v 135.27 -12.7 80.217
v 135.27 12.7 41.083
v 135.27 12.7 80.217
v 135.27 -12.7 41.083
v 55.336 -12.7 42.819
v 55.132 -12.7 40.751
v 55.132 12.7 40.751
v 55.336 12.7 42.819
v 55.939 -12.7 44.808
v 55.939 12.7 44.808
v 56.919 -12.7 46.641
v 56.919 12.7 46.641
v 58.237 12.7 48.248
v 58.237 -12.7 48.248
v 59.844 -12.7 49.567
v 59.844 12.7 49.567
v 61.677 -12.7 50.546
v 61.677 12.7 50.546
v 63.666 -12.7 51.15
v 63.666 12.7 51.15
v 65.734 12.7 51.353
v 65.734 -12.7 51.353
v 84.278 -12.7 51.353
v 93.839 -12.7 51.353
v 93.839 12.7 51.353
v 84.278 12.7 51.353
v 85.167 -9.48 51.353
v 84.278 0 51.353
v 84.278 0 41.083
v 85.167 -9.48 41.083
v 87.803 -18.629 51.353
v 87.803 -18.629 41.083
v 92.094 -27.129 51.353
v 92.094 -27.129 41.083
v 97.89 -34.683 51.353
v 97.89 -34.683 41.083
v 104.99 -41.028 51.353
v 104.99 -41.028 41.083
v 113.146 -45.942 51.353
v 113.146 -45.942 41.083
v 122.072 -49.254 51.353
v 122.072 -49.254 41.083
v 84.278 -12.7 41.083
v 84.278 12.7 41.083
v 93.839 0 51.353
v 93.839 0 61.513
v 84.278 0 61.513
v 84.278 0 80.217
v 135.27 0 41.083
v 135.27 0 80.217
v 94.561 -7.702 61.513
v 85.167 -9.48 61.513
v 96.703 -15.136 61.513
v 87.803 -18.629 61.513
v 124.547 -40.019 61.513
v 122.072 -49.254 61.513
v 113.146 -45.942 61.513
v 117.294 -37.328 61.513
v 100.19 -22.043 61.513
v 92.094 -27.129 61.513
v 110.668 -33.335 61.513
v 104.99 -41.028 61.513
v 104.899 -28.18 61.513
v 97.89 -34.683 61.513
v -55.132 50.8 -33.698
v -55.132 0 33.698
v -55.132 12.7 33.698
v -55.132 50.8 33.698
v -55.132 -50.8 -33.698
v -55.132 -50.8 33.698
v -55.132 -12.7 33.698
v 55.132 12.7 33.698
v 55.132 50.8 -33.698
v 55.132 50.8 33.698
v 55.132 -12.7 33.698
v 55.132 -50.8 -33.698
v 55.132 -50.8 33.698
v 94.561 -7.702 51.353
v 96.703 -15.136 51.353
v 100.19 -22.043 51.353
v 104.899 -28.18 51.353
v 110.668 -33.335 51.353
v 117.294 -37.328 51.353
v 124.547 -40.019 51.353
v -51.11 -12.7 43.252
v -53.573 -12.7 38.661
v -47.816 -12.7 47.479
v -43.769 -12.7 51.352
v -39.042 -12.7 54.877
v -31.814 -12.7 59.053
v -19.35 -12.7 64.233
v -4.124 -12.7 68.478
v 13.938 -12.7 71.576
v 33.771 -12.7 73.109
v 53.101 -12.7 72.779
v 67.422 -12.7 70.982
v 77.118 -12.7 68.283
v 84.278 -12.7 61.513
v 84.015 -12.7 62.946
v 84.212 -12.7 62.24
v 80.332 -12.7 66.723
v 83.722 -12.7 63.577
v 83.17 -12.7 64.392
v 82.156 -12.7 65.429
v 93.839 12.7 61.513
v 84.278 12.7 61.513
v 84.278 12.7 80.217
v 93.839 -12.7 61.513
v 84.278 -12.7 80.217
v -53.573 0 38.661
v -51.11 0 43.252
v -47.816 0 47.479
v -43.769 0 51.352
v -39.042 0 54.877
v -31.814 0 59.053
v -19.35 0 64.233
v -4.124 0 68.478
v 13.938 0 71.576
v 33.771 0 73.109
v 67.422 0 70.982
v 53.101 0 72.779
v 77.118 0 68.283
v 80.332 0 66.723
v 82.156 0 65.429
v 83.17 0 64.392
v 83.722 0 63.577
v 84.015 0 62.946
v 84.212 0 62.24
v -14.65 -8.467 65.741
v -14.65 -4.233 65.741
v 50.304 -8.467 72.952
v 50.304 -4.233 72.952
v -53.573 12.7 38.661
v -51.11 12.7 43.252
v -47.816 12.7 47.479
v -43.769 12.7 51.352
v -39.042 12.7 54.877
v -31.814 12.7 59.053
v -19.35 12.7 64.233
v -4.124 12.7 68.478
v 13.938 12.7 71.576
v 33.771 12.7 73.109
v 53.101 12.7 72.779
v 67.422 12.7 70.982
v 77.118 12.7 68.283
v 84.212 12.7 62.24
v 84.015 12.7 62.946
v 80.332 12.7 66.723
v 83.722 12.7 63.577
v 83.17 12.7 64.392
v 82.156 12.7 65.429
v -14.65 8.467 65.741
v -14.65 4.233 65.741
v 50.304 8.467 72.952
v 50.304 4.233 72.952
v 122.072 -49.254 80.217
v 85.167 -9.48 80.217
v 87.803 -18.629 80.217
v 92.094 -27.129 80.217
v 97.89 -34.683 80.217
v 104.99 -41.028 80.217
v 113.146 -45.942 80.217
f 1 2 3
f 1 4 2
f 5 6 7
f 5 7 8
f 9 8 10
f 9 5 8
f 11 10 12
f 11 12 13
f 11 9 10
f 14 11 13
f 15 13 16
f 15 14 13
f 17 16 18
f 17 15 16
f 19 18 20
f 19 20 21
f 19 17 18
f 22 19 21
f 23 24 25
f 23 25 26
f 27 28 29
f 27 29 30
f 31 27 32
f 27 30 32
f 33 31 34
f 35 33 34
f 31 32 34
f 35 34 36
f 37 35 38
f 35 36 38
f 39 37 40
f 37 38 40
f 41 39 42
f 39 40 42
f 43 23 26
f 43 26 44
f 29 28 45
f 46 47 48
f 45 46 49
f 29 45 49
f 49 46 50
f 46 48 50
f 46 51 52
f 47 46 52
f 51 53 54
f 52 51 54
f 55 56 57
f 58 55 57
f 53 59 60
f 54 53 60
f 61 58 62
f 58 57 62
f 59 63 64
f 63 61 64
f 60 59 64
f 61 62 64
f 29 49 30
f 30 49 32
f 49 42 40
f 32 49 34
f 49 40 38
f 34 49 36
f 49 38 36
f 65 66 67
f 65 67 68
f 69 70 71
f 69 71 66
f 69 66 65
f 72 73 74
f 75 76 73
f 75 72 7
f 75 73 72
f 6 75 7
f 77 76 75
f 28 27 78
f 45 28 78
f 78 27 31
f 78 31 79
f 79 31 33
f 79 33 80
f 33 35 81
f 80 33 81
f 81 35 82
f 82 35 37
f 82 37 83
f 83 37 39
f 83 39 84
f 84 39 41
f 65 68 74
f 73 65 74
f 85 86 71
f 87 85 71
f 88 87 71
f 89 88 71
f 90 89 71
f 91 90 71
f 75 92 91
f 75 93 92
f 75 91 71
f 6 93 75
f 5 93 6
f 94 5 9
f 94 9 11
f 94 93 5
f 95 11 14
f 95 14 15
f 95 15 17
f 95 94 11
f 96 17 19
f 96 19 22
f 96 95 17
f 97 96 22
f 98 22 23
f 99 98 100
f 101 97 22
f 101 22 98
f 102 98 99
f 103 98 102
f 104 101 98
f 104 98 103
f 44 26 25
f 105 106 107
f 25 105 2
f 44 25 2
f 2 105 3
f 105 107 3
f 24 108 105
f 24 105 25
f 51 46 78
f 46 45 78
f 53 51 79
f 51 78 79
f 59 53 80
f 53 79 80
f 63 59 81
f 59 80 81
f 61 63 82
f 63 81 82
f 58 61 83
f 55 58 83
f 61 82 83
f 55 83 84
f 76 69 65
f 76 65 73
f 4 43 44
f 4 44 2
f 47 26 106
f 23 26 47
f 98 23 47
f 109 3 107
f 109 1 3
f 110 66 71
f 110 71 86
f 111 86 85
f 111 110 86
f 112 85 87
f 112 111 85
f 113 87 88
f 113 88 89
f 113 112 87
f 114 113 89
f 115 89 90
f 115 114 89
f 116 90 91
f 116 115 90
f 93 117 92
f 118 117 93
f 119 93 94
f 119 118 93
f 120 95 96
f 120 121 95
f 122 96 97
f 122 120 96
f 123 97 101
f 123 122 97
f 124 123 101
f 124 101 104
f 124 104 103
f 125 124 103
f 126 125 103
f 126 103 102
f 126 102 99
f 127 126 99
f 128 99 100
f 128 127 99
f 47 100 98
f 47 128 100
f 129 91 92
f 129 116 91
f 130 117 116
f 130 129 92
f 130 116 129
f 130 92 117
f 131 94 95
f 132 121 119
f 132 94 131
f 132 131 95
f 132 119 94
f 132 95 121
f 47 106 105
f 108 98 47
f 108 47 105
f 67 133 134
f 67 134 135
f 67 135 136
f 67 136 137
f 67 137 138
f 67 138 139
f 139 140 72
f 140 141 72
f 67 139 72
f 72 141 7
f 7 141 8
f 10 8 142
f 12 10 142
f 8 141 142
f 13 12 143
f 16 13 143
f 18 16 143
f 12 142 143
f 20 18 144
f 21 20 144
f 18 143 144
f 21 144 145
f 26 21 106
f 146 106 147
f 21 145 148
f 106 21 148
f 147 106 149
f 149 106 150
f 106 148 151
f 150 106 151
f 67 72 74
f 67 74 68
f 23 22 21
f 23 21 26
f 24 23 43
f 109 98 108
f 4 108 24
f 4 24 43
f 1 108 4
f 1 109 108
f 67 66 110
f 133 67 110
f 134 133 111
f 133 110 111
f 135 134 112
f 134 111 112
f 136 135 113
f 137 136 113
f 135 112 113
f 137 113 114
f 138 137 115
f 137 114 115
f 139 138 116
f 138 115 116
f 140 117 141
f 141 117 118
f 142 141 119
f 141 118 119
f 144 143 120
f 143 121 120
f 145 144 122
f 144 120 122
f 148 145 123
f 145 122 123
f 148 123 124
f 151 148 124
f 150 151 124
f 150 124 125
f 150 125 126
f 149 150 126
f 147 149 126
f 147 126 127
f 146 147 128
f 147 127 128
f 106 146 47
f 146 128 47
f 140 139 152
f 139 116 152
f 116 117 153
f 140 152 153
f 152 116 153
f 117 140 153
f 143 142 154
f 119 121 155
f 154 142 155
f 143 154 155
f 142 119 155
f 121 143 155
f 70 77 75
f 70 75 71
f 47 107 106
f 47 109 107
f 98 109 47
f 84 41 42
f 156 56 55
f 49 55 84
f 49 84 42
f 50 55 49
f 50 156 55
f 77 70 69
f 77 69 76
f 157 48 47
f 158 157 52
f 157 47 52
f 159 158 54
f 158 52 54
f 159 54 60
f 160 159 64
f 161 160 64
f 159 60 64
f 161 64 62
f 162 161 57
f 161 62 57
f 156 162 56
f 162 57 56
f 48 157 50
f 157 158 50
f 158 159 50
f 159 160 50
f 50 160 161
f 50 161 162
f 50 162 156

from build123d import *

# Parameters (mm, degrees)
F1_DEPTH = 50.8
F2_DEPTH = 12.7
F3_ANGLE = 75


with BuildPart() as f1:
    # F0 (on Front) → F1 (new body, symmetric)
    with BuildSketch(Plane.XZ):
        Polygon((44.971988, 33.697547), (-55.131988, 33.697547), (-55.131988, -33.697547), (55.131988, -33.697547), (55.131988, 33.697547), align=None)
    extrude(amount=F1_DEPTH, both=True)

    # F0 (on Front) → F2 (join, symmetric)
    with BuildSketch(Plane.XZ):
        Polygon((84.278196, 80.2169), (84.278196, 61.513367), (93.839183, 61.513367), (93.839183, 51.353367), (84.278196, 51.353367), (84.278196, 41.083422), (135.270059, 41.083422), (135.270059, 80.2169), align=None)
        with BuildLine():
            Line((44.971988, 40.750895), (44.971988, 33.697547))
            Line((44.971988, 33.697547), (55.131988, 33.697547))
            Line((55.131988, 33.697547), (55.131988, 40.750895))
            ThreePointArc((55.131988, 40.750895), (58.23738, 48.247975), (65.73446, 51.353367))
            Line((65.73446, 51.353367), (84.278196, 51.353367))
            Line((84.278196, 51.353367), (84.278196, 61.513367))
            Line((84.278196, 61.513367), (65.73446, 61.513367))
            ThreePointArc((65.73446, 61.513367), (51.053175, 55.43218), (44.971988, 40.750895))
        make_face()
        with BuildLine():
            add(Edge.make_bspline(
                [(-55.131988, 33.697547), (-45.370411, 80.2169), (84.278196, 80.2169), (84.278196, 61.513367)],
                knots=[0, 0, 0, 0, 142.158078, 142.158078, 142.158078, 142.158078], degree=3))
            Line((-55.131988, 33.697547), (44.971988, 33.697547))
            Line((44.971988, 33.697547), (44.971988, 40.750895))
            ThreePointArc((44.971988, 40.750895), (51.053175, 55.43218), (65.73446, 61.513367))
            Line((65.73446, 61.513367), (84.278196, 61.513367))
        make_face()
    extrude(amount=F2_DEPTH, both=True)


with BuildPart() as f3:
    # F0 (on Front) → F3 (revolve)
    with BuildSketch(Plane.XZ):
        Polygon((84.278196, 80.2169), (84.278196, 61.513367), (93.839183, 61.513367), (93.839183, 51.353367), (84.278196, 51.353367), (84.278196, 41.083422), (135.270059, 41.083422), (135.270059, 80.2169), align=None)
    revolve(axis=Axis((135.270059, 0, 60.650161), (0, 0, 1)), revolution_arc=F3_ANGLE)


solid = Compound([f1.part, f3.part])
